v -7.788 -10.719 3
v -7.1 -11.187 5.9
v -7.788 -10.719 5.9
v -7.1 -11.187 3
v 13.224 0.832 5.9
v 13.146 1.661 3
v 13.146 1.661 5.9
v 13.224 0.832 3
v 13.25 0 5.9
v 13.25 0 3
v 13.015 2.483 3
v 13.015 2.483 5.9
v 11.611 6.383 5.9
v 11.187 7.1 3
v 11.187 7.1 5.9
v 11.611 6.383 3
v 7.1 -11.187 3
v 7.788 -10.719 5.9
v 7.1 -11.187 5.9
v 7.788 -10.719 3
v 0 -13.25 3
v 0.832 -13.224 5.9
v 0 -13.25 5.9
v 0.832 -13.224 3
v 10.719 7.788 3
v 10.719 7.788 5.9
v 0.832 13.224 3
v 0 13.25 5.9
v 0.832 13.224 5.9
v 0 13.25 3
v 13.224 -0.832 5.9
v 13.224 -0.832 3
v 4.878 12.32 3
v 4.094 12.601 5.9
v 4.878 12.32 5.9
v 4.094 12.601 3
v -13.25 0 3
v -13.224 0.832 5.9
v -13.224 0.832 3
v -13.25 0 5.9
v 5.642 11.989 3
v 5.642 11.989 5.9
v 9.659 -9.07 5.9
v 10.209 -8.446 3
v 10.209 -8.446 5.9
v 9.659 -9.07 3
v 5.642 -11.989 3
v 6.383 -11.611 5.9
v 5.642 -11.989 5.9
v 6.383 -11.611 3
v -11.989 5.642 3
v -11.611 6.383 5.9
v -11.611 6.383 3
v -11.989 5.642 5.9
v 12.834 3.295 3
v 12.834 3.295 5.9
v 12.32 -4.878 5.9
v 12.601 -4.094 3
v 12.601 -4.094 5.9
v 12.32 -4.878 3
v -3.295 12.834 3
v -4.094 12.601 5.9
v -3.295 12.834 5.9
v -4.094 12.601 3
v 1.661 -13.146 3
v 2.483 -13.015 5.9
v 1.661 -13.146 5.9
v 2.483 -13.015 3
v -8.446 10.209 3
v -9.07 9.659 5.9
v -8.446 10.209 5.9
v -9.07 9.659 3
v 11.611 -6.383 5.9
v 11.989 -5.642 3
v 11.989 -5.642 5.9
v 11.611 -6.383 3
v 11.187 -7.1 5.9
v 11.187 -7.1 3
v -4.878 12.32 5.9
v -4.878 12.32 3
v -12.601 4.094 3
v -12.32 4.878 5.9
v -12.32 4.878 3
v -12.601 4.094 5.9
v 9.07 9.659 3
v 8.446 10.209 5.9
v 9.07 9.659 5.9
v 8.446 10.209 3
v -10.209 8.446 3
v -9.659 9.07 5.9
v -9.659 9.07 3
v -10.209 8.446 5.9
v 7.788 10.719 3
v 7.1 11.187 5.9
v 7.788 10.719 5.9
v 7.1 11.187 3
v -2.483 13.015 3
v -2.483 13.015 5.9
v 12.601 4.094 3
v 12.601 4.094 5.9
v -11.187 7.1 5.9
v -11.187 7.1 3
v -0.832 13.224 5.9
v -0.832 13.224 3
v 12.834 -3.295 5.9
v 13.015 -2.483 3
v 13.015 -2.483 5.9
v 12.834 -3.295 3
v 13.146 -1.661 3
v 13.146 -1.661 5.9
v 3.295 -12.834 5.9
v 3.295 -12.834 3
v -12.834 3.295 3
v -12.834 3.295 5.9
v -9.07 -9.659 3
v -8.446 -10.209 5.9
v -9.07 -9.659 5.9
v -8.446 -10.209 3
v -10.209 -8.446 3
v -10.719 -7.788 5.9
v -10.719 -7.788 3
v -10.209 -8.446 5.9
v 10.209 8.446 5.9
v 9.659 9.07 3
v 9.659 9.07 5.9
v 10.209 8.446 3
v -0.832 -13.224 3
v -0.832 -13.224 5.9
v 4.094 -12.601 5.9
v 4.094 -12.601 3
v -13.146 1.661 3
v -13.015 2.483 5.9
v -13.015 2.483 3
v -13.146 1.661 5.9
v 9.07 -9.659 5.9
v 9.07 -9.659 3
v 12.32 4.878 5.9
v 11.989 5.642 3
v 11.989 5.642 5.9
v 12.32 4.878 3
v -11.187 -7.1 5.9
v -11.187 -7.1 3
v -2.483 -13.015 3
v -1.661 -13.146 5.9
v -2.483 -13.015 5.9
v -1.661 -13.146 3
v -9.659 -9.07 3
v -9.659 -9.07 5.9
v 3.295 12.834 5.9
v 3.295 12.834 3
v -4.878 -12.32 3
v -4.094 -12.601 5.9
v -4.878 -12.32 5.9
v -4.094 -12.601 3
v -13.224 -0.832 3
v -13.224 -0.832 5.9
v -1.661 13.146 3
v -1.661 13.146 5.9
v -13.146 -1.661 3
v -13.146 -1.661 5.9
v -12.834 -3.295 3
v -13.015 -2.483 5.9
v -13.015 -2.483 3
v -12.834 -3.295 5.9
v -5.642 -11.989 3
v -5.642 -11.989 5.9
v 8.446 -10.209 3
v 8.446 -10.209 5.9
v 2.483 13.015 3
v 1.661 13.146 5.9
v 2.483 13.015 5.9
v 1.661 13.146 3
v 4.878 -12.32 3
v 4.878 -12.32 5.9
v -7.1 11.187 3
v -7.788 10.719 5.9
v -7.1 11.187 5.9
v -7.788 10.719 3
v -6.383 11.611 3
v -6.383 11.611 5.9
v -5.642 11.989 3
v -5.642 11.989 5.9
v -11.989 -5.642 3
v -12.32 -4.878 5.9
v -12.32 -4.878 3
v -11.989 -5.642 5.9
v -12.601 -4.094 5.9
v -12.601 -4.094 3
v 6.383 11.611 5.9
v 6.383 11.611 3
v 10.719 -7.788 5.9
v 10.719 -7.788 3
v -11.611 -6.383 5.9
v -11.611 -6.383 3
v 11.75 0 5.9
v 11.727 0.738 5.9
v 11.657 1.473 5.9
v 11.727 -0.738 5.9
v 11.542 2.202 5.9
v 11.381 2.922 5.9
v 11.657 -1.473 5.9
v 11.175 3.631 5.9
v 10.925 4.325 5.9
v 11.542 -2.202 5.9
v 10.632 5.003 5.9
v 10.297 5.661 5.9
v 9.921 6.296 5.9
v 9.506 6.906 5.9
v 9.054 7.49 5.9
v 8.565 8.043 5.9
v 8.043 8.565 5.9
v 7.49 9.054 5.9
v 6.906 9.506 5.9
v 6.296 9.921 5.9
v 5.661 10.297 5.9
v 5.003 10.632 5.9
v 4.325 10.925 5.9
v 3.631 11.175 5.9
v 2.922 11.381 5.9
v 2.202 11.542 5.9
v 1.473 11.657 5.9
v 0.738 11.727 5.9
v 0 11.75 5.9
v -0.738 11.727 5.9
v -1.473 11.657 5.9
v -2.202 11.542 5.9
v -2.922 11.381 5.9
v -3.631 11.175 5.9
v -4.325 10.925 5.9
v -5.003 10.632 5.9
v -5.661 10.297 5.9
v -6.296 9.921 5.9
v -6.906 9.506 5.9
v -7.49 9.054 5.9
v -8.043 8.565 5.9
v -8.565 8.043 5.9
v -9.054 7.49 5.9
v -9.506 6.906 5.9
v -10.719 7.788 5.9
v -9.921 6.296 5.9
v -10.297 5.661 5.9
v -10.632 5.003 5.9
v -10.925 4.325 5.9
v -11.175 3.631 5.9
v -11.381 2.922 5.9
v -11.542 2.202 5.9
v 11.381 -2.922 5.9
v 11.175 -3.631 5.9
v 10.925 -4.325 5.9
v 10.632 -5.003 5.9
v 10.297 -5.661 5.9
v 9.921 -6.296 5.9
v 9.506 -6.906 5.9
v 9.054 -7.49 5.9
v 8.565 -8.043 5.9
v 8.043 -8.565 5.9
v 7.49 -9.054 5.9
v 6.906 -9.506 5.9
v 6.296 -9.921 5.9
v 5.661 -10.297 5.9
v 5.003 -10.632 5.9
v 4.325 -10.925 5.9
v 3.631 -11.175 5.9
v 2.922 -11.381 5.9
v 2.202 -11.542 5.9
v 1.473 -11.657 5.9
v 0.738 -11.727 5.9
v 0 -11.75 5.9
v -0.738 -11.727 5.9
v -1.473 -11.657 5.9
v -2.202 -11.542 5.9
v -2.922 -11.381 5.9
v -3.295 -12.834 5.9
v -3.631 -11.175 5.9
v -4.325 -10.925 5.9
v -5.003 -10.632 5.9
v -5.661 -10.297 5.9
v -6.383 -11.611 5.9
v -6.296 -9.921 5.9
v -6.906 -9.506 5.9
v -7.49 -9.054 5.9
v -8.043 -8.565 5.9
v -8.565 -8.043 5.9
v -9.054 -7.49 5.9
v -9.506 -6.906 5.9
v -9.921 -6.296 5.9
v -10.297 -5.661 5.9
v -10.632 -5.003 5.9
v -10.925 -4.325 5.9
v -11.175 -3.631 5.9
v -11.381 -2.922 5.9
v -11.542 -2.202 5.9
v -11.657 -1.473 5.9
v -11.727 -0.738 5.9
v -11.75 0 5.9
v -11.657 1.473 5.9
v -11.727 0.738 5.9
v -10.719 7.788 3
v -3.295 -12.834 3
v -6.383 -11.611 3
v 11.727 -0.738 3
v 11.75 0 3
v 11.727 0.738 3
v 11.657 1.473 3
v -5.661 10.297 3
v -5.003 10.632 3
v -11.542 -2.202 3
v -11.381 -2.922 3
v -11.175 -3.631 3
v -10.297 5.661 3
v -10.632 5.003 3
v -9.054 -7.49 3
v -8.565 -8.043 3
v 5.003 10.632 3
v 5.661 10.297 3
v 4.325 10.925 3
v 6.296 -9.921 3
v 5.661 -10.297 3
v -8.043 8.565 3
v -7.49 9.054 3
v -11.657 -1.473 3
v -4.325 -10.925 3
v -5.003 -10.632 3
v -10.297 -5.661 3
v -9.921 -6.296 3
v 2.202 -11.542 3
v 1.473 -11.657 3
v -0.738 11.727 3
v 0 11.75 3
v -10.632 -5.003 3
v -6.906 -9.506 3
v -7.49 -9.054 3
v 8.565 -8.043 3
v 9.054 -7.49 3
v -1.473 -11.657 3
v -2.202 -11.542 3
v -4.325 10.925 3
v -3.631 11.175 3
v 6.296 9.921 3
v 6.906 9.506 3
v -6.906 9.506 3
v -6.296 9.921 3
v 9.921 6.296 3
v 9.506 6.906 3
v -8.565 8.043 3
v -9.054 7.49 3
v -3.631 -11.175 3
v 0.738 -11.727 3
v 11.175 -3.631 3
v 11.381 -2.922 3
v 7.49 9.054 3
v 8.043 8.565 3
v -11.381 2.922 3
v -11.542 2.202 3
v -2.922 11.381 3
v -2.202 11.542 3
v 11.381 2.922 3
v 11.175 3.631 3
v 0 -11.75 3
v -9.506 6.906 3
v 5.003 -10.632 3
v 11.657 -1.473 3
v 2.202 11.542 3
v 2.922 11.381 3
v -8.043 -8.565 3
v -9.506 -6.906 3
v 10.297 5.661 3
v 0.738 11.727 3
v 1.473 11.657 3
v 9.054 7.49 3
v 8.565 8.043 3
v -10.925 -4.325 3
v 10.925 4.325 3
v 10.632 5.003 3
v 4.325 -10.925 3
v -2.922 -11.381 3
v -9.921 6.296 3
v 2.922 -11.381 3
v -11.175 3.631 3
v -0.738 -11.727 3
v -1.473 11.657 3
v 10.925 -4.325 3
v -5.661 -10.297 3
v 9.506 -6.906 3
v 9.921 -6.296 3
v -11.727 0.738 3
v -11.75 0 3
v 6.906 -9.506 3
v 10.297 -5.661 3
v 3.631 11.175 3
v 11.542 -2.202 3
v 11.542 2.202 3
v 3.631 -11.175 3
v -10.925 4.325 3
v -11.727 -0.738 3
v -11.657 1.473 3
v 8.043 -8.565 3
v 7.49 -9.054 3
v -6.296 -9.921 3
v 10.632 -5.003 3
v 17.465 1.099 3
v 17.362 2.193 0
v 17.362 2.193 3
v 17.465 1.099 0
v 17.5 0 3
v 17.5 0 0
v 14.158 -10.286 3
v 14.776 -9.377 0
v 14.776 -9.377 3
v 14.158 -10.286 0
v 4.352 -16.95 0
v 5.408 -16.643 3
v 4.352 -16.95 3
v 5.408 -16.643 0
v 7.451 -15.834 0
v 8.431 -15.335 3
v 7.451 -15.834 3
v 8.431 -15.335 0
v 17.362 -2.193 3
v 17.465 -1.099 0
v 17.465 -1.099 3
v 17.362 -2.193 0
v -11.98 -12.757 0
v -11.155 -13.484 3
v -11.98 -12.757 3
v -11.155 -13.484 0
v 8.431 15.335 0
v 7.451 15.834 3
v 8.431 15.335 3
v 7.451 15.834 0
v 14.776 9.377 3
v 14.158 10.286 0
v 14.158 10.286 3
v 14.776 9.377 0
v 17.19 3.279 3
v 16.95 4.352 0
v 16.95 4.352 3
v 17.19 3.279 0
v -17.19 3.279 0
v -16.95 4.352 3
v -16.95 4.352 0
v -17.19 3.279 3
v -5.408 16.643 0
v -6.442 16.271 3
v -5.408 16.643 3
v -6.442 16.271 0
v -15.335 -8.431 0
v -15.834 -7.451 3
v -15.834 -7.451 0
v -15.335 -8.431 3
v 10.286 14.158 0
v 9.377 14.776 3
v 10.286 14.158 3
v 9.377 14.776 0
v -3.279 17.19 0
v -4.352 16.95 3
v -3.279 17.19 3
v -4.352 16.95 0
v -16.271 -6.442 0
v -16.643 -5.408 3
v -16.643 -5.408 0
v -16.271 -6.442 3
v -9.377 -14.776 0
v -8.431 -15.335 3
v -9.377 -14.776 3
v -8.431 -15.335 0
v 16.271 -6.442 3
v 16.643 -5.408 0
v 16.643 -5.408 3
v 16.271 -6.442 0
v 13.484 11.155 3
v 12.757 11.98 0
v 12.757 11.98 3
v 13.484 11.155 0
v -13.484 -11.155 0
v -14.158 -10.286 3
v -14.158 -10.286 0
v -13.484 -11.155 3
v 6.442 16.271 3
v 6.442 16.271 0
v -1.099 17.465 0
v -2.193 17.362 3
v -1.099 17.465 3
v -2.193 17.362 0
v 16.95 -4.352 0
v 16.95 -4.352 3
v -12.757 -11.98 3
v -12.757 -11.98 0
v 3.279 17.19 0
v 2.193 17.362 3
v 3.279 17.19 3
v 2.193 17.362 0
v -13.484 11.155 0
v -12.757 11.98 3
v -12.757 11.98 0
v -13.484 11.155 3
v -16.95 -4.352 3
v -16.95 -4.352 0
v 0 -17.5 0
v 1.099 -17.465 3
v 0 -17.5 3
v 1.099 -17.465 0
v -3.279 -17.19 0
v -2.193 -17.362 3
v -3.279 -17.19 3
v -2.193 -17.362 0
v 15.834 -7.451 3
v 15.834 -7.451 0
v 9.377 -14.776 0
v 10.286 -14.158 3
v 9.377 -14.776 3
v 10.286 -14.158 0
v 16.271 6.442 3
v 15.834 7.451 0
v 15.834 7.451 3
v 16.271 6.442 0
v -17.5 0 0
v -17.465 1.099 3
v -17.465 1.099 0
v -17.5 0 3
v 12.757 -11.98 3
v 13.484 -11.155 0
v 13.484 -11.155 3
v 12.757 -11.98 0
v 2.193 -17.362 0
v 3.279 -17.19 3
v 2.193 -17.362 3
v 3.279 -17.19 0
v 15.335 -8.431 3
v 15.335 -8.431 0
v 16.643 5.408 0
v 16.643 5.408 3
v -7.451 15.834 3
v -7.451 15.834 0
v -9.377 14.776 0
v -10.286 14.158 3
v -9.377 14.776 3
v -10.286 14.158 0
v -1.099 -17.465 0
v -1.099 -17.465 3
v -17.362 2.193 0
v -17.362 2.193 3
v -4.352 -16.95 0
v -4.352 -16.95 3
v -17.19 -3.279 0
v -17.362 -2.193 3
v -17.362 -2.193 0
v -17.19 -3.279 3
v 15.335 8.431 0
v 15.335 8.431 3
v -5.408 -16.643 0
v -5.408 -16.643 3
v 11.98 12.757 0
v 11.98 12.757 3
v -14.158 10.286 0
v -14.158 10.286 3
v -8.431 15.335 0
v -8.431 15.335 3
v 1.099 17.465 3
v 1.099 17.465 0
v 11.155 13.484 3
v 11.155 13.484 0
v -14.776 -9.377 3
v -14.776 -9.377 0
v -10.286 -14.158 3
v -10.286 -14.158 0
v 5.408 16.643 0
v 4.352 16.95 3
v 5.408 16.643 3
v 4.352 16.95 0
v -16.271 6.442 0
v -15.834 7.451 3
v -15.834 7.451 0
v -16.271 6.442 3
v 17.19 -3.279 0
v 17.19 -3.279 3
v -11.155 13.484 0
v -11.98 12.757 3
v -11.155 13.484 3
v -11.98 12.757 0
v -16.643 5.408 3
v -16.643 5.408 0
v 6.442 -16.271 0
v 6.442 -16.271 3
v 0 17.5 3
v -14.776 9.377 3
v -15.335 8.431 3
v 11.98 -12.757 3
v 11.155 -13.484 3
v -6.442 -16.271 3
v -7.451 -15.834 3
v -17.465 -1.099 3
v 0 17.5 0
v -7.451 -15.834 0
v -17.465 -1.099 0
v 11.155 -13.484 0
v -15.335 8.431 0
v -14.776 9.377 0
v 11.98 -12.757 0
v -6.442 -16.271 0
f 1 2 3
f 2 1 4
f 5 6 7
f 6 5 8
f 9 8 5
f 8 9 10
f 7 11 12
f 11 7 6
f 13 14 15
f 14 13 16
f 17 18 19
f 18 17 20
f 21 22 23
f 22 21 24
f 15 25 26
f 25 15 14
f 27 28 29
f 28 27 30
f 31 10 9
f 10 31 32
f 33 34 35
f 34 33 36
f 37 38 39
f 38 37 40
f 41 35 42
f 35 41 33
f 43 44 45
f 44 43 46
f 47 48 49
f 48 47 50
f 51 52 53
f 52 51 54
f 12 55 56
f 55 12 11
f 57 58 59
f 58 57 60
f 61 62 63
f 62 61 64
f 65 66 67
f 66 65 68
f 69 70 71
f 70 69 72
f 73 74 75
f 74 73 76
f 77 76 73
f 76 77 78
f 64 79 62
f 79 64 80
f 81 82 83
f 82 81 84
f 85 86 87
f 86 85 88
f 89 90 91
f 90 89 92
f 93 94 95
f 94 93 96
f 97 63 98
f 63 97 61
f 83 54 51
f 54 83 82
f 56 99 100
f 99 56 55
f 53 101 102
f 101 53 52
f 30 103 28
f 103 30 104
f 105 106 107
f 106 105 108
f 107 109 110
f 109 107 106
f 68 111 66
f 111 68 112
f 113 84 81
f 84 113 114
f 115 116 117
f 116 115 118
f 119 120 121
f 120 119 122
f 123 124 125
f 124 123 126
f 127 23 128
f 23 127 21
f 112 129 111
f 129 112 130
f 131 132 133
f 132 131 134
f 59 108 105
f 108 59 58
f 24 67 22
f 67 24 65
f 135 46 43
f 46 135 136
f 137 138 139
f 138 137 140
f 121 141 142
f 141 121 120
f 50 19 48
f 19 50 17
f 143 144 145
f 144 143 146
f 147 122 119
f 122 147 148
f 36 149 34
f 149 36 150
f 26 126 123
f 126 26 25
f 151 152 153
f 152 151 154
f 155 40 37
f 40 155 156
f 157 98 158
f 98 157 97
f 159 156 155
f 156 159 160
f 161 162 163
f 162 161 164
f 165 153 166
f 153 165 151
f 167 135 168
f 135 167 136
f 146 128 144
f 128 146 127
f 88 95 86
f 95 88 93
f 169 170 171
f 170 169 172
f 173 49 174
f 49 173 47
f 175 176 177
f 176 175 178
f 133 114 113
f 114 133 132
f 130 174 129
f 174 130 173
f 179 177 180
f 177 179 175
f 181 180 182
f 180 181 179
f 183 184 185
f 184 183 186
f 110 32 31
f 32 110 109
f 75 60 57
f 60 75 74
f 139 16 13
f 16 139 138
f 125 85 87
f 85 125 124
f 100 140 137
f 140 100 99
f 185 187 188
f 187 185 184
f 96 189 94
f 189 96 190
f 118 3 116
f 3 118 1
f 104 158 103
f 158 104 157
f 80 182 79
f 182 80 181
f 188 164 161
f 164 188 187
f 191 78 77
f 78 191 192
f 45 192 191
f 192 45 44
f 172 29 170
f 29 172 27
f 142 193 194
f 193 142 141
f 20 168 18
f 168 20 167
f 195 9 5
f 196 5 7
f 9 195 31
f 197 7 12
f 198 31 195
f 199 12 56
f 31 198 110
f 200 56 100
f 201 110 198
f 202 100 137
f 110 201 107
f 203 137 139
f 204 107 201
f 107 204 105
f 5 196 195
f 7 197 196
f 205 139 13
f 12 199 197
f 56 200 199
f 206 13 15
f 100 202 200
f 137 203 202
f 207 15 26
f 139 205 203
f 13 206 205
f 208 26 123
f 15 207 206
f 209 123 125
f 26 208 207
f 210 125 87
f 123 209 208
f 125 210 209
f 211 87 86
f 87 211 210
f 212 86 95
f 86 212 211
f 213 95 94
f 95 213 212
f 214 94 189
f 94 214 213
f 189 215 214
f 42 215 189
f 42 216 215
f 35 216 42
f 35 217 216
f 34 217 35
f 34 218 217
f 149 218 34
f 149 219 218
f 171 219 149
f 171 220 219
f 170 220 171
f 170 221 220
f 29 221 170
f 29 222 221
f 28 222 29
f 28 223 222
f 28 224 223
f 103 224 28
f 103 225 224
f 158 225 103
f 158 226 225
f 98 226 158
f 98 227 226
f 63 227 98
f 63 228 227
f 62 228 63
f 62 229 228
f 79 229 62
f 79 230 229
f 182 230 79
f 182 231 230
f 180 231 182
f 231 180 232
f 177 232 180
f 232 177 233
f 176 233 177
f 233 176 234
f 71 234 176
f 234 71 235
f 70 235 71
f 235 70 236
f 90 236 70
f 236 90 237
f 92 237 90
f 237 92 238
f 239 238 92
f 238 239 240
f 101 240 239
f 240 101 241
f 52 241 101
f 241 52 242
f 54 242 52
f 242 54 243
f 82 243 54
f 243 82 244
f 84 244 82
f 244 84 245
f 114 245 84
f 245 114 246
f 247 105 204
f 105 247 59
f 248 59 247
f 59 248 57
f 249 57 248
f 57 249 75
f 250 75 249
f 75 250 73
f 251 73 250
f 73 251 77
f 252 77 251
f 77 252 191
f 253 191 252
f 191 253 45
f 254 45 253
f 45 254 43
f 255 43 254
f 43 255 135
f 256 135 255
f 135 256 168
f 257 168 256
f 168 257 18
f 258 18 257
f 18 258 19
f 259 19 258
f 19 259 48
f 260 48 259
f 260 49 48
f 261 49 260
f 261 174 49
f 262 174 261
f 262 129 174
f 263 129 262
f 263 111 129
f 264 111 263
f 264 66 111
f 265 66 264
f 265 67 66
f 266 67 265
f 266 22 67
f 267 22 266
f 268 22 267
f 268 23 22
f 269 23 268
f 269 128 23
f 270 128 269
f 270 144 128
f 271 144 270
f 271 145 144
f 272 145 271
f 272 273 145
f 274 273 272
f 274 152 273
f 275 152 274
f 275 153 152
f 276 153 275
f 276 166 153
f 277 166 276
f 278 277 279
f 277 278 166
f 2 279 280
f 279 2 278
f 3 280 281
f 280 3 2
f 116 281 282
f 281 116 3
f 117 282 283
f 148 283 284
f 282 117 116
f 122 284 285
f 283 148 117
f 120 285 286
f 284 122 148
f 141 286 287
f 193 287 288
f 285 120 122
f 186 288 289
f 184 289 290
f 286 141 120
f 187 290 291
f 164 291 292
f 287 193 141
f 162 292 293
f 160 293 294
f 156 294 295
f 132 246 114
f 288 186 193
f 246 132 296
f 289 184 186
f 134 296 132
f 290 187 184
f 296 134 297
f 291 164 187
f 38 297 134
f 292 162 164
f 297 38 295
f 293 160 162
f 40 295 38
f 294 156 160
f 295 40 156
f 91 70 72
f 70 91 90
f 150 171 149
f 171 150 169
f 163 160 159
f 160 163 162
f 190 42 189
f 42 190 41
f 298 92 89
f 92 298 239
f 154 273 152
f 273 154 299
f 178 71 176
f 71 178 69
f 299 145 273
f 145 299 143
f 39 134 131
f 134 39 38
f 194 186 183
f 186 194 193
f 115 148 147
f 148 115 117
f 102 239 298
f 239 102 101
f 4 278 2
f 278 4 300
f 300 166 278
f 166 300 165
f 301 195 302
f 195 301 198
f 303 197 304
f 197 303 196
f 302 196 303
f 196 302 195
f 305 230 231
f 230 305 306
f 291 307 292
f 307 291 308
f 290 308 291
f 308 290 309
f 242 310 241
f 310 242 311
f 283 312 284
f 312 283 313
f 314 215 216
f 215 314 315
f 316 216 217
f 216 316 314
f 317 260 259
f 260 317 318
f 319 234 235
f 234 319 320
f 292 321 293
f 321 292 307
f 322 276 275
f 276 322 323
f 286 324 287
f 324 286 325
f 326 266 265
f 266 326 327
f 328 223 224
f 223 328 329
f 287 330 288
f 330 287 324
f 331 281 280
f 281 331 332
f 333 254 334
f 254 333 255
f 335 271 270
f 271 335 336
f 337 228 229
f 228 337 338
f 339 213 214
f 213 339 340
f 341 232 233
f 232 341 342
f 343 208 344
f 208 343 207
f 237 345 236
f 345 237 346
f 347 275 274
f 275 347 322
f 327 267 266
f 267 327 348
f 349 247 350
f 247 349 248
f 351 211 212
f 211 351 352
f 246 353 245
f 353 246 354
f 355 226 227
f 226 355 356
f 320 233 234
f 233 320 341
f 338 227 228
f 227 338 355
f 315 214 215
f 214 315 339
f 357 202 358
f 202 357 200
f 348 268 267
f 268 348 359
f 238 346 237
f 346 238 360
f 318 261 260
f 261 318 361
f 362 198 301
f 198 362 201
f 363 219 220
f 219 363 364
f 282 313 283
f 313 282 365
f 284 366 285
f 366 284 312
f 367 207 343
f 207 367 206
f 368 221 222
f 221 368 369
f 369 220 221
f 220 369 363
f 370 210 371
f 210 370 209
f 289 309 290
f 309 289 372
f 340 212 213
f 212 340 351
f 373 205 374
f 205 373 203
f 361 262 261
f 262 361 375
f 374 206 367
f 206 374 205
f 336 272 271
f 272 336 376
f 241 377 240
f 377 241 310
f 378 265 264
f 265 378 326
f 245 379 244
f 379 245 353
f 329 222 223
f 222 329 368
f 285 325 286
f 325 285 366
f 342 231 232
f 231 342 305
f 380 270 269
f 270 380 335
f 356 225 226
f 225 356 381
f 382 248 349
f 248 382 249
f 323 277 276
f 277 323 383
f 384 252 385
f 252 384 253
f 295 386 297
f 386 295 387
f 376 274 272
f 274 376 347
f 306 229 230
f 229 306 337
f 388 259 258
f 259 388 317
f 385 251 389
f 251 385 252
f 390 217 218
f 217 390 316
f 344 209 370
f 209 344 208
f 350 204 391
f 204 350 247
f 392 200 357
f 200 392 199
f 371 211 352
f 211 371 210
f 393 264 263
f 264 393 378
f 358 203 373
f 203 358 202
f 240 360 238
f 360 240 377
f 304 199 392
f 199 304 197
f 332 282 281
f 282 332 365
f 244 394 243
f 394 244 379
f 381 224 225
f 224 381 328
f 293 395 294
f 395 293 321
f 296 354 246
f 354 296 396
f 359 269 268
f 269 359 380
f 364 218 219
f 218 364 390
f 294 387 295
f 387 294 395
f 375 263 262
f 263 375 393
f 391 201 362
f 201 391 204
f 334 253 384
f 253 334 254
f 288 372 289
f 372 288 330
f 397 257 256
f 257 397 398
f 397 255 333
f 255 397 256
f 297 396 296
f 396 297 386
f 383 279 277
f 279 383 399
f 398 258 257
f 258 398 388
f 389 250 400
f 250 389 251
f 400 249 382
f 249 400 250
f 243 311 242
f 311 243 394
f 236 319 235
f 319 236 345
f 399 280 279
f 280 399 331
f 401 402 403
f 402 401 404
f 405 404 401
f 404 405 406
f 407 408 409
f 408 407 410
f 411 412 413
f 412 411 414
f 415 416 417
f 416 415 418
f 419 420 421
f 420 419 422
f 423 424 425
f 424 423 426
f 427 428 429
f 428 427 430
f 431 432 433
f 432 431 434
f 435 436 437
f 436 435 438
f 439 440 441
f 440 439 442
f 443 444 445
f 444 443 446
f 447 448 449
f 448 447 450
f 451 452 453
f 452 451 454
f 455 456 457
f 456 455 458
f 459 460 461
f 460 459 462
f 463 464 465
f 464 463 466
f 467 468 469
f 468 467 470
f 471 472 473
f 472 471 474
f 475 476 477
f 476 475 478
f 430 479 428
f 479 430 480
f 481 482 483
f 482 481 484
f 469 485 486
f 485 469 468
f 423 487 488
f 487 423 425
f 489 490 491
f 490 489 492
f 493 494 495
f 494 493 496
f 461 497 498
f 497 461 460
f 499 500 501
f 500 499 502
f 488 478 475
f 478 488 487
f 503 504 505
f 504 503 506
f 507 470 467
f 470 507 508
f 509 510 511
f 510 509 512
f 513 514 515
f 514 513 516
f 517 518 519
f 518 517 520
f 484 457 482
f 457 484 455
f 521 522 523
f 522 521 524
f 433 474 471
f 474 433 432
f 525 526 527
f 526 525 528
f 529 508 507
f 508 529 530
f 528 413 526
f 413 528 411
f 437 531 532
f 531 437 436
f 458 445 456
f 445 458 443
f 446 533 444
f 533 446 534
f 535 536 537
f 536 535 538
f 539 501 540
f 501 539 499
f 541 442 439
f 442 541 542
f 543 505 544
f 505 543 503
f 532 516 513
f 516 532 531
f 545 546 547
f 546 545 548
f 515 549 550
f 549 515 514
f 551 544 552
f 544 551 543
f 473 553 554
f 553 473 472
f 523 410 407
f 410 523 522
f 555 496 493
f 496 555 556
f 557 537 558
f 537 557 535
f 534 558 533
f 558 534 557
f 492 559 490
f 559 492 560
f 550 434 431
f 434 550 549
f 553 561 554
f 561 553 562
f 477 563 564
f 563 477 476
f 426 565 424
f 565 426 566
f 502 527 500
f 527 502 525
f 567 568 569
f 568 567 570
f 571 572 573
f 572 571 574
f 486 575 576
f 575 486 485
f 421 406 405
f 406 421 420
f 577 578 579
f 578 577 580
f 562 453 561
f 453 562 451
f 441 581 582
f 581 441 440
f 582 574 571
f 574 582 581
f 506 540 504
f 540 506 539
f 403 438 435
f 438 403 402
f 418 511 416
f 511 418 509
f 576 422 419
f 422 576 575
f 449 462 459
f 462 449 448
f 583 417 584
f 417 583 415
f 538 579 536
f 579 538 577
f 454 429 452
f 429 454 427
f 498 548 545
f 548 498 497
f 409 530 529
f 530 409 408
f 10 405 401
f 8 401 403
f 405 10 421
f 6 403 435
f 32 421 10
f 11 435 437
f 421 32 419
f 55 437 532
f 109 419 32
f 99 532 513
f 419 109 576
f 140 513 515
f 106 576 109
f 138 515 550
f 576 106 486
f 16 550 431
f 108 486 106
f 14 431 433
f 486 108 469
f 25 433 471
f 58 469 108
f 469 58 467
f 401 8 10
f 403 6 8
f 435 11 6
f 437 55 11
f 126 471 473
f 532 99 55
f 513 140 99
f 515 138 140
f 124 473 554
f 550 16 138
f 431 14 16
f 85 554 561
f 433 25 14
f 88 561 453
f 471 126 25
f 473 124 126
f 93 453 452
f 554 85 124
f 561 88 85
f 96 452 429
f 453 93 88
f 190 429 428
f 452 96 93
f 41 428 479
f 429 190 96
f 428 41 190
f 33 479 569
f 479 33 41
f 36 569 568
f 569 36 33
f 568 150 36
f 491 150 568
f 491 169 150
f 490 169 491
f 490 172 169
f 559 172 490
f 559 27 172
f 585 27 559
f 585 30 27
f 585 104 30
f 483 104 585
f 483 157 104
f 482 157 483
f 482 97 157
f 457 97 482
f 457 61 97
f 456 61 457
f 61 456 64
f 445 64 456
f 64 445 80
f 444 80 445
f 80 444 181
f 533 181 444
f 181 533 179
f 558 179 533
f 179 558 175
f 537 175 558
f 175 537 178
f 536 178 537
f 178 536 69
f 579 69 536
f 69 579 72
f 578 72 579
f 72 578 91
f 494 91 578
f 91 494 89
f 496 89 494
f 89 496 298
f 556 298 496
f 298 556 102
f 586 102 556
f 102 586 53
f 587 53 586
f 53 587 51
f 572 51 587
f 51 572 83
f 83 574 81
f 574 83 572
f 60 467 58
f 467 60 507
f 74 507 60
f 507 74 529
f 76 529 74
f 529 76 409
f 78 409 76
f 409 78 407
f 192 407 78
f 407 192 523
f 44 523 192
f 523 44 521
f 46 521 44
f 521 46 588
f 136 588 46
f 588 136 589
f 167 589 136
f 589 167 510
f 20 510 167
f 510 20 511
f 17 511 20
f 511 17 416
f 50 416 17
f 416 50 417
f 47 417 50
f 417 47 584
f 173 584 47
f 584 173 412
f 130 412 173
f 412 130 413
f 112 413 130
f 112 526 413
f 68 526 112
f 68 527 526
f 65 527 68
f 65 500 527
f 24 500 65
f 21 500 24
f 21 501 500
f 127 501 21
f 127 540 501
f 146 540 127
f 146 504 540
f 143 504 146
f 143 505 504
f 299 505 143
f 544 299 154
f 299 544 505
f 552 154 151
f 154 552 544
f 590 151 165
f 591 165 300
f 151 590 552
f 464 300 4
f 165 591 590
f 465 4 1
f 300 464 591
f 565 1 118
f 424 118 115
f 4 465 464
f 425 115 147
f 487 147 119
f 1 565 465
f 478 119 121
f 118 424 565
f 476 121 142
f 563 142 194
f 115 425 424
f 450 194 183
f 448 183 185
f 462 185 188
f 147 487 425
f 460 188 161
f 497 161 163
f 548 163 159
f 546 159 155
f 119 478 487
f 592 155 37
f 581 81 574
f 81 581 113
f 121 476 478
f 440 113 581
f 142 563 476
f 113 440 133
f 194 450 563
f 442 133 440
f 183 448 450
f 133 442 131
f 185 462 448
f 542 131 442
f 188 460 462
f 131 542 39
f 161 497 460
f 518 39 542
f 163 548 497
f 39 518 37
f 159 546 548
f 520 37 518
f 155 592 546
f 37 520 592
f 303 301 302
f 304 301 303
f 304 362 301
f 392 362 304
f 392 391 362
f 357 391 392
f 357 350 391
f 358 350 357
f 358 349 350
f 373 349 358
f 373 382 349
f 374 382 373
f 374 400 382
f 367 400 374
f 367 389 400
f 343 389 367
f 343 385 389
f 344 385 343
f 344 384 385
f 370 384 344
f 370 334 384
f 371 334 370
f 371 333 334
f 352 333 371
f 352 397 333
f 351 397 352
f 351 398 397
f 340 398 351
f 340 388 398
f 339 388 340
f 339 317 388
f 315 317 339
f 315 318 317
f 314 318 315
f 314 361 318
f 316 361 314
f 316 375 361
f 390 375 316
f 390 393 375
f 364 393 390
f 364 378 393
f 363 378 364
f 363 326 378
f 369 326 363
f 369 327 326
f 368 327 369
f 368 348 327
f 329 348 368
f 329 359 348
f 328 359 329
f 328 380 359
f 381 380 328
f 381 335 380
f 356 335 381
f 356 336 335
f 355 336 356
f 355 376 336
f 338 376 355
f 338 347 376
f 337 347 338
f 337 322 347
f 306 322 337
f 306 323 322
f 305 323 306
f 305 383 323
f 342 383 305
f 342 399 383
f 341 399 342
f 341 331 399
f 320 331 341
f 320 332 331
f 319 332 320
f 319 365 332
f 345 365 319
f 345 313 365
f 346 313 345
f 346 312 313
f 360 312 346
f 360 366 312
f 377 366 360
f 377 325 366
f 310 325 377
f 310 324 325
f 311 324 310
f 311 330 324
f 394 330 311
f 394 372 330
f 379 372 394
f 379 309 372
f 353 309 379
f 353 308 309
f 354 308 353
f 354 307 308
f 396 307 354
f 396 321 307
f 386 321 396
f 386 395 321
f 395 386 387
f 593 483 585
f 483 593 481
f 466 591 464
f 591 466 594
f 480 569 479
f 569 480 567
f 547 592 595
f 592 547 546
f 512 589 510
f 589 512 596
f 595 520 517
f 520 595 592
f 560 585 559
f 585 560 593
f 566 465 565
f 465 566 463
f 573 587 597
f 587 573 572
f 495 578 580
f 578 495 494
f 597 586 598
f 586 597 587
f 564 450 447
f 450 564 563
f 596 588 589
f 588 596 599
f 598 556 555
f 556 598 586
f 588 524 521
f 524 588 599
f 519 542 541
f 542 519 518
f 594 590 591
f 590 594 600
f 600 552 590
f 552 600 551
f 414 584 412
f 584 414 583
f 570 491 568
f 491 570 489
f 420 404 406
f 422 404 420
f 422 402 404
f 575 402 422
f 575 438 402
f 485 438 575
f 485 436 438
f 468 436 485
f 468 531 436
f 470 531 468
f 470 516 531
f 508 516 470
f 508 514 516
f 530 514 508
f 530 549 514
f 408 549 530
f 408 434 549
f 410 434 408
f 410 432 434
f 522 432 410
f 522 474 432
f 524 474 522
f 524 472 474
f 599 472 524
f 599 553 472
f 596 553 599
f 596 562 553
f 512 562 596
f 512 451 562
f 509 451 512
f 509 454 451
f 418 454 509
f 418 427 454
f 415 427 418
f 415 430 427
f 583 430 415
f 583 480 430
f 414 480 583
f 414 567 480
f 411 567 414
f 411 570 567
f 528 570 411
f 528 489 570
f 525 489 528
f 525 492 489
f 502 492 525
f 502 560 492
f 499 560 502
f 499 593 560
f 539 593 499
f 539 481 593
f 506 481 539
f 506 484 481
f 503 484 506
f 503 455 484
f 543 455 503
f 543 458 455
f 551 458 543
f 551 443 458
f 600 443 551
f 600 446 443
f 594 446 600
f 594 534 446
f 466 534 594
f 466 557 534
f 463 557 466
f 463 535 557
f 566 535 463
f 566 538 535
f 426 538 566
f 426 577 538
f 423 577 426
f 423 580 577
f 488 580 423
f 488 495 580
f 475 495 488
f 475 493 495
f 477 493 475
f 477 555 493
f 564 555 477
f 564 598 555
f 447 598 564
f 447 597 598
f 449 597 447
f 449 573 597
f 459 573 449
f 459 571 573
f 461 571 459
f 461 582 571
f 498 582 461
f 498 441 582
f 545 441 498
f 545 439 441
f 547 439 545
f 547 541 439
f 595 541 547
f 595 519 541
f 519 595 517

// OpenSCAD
foot_insert_height=3;
foot_insert_depth=3;
foot_height=3;
overlap = .1;

translate([0, 0, foot_height/2]) 
	cylinder(foot_height, d=35, center=true, $fn=100);


translate([0, 0, foot_height-overlap + foot_insert_height/2]) 
	difference() {
	  cylinder(foot_insert_height, d=26.5, center=true, $fn=100);
	  translate([0,0,-overlap]) cylinder(foot_insert_height+(overlap*3), d=26.5 - foot_insert_depth, center=true, $fn=100);
	}
